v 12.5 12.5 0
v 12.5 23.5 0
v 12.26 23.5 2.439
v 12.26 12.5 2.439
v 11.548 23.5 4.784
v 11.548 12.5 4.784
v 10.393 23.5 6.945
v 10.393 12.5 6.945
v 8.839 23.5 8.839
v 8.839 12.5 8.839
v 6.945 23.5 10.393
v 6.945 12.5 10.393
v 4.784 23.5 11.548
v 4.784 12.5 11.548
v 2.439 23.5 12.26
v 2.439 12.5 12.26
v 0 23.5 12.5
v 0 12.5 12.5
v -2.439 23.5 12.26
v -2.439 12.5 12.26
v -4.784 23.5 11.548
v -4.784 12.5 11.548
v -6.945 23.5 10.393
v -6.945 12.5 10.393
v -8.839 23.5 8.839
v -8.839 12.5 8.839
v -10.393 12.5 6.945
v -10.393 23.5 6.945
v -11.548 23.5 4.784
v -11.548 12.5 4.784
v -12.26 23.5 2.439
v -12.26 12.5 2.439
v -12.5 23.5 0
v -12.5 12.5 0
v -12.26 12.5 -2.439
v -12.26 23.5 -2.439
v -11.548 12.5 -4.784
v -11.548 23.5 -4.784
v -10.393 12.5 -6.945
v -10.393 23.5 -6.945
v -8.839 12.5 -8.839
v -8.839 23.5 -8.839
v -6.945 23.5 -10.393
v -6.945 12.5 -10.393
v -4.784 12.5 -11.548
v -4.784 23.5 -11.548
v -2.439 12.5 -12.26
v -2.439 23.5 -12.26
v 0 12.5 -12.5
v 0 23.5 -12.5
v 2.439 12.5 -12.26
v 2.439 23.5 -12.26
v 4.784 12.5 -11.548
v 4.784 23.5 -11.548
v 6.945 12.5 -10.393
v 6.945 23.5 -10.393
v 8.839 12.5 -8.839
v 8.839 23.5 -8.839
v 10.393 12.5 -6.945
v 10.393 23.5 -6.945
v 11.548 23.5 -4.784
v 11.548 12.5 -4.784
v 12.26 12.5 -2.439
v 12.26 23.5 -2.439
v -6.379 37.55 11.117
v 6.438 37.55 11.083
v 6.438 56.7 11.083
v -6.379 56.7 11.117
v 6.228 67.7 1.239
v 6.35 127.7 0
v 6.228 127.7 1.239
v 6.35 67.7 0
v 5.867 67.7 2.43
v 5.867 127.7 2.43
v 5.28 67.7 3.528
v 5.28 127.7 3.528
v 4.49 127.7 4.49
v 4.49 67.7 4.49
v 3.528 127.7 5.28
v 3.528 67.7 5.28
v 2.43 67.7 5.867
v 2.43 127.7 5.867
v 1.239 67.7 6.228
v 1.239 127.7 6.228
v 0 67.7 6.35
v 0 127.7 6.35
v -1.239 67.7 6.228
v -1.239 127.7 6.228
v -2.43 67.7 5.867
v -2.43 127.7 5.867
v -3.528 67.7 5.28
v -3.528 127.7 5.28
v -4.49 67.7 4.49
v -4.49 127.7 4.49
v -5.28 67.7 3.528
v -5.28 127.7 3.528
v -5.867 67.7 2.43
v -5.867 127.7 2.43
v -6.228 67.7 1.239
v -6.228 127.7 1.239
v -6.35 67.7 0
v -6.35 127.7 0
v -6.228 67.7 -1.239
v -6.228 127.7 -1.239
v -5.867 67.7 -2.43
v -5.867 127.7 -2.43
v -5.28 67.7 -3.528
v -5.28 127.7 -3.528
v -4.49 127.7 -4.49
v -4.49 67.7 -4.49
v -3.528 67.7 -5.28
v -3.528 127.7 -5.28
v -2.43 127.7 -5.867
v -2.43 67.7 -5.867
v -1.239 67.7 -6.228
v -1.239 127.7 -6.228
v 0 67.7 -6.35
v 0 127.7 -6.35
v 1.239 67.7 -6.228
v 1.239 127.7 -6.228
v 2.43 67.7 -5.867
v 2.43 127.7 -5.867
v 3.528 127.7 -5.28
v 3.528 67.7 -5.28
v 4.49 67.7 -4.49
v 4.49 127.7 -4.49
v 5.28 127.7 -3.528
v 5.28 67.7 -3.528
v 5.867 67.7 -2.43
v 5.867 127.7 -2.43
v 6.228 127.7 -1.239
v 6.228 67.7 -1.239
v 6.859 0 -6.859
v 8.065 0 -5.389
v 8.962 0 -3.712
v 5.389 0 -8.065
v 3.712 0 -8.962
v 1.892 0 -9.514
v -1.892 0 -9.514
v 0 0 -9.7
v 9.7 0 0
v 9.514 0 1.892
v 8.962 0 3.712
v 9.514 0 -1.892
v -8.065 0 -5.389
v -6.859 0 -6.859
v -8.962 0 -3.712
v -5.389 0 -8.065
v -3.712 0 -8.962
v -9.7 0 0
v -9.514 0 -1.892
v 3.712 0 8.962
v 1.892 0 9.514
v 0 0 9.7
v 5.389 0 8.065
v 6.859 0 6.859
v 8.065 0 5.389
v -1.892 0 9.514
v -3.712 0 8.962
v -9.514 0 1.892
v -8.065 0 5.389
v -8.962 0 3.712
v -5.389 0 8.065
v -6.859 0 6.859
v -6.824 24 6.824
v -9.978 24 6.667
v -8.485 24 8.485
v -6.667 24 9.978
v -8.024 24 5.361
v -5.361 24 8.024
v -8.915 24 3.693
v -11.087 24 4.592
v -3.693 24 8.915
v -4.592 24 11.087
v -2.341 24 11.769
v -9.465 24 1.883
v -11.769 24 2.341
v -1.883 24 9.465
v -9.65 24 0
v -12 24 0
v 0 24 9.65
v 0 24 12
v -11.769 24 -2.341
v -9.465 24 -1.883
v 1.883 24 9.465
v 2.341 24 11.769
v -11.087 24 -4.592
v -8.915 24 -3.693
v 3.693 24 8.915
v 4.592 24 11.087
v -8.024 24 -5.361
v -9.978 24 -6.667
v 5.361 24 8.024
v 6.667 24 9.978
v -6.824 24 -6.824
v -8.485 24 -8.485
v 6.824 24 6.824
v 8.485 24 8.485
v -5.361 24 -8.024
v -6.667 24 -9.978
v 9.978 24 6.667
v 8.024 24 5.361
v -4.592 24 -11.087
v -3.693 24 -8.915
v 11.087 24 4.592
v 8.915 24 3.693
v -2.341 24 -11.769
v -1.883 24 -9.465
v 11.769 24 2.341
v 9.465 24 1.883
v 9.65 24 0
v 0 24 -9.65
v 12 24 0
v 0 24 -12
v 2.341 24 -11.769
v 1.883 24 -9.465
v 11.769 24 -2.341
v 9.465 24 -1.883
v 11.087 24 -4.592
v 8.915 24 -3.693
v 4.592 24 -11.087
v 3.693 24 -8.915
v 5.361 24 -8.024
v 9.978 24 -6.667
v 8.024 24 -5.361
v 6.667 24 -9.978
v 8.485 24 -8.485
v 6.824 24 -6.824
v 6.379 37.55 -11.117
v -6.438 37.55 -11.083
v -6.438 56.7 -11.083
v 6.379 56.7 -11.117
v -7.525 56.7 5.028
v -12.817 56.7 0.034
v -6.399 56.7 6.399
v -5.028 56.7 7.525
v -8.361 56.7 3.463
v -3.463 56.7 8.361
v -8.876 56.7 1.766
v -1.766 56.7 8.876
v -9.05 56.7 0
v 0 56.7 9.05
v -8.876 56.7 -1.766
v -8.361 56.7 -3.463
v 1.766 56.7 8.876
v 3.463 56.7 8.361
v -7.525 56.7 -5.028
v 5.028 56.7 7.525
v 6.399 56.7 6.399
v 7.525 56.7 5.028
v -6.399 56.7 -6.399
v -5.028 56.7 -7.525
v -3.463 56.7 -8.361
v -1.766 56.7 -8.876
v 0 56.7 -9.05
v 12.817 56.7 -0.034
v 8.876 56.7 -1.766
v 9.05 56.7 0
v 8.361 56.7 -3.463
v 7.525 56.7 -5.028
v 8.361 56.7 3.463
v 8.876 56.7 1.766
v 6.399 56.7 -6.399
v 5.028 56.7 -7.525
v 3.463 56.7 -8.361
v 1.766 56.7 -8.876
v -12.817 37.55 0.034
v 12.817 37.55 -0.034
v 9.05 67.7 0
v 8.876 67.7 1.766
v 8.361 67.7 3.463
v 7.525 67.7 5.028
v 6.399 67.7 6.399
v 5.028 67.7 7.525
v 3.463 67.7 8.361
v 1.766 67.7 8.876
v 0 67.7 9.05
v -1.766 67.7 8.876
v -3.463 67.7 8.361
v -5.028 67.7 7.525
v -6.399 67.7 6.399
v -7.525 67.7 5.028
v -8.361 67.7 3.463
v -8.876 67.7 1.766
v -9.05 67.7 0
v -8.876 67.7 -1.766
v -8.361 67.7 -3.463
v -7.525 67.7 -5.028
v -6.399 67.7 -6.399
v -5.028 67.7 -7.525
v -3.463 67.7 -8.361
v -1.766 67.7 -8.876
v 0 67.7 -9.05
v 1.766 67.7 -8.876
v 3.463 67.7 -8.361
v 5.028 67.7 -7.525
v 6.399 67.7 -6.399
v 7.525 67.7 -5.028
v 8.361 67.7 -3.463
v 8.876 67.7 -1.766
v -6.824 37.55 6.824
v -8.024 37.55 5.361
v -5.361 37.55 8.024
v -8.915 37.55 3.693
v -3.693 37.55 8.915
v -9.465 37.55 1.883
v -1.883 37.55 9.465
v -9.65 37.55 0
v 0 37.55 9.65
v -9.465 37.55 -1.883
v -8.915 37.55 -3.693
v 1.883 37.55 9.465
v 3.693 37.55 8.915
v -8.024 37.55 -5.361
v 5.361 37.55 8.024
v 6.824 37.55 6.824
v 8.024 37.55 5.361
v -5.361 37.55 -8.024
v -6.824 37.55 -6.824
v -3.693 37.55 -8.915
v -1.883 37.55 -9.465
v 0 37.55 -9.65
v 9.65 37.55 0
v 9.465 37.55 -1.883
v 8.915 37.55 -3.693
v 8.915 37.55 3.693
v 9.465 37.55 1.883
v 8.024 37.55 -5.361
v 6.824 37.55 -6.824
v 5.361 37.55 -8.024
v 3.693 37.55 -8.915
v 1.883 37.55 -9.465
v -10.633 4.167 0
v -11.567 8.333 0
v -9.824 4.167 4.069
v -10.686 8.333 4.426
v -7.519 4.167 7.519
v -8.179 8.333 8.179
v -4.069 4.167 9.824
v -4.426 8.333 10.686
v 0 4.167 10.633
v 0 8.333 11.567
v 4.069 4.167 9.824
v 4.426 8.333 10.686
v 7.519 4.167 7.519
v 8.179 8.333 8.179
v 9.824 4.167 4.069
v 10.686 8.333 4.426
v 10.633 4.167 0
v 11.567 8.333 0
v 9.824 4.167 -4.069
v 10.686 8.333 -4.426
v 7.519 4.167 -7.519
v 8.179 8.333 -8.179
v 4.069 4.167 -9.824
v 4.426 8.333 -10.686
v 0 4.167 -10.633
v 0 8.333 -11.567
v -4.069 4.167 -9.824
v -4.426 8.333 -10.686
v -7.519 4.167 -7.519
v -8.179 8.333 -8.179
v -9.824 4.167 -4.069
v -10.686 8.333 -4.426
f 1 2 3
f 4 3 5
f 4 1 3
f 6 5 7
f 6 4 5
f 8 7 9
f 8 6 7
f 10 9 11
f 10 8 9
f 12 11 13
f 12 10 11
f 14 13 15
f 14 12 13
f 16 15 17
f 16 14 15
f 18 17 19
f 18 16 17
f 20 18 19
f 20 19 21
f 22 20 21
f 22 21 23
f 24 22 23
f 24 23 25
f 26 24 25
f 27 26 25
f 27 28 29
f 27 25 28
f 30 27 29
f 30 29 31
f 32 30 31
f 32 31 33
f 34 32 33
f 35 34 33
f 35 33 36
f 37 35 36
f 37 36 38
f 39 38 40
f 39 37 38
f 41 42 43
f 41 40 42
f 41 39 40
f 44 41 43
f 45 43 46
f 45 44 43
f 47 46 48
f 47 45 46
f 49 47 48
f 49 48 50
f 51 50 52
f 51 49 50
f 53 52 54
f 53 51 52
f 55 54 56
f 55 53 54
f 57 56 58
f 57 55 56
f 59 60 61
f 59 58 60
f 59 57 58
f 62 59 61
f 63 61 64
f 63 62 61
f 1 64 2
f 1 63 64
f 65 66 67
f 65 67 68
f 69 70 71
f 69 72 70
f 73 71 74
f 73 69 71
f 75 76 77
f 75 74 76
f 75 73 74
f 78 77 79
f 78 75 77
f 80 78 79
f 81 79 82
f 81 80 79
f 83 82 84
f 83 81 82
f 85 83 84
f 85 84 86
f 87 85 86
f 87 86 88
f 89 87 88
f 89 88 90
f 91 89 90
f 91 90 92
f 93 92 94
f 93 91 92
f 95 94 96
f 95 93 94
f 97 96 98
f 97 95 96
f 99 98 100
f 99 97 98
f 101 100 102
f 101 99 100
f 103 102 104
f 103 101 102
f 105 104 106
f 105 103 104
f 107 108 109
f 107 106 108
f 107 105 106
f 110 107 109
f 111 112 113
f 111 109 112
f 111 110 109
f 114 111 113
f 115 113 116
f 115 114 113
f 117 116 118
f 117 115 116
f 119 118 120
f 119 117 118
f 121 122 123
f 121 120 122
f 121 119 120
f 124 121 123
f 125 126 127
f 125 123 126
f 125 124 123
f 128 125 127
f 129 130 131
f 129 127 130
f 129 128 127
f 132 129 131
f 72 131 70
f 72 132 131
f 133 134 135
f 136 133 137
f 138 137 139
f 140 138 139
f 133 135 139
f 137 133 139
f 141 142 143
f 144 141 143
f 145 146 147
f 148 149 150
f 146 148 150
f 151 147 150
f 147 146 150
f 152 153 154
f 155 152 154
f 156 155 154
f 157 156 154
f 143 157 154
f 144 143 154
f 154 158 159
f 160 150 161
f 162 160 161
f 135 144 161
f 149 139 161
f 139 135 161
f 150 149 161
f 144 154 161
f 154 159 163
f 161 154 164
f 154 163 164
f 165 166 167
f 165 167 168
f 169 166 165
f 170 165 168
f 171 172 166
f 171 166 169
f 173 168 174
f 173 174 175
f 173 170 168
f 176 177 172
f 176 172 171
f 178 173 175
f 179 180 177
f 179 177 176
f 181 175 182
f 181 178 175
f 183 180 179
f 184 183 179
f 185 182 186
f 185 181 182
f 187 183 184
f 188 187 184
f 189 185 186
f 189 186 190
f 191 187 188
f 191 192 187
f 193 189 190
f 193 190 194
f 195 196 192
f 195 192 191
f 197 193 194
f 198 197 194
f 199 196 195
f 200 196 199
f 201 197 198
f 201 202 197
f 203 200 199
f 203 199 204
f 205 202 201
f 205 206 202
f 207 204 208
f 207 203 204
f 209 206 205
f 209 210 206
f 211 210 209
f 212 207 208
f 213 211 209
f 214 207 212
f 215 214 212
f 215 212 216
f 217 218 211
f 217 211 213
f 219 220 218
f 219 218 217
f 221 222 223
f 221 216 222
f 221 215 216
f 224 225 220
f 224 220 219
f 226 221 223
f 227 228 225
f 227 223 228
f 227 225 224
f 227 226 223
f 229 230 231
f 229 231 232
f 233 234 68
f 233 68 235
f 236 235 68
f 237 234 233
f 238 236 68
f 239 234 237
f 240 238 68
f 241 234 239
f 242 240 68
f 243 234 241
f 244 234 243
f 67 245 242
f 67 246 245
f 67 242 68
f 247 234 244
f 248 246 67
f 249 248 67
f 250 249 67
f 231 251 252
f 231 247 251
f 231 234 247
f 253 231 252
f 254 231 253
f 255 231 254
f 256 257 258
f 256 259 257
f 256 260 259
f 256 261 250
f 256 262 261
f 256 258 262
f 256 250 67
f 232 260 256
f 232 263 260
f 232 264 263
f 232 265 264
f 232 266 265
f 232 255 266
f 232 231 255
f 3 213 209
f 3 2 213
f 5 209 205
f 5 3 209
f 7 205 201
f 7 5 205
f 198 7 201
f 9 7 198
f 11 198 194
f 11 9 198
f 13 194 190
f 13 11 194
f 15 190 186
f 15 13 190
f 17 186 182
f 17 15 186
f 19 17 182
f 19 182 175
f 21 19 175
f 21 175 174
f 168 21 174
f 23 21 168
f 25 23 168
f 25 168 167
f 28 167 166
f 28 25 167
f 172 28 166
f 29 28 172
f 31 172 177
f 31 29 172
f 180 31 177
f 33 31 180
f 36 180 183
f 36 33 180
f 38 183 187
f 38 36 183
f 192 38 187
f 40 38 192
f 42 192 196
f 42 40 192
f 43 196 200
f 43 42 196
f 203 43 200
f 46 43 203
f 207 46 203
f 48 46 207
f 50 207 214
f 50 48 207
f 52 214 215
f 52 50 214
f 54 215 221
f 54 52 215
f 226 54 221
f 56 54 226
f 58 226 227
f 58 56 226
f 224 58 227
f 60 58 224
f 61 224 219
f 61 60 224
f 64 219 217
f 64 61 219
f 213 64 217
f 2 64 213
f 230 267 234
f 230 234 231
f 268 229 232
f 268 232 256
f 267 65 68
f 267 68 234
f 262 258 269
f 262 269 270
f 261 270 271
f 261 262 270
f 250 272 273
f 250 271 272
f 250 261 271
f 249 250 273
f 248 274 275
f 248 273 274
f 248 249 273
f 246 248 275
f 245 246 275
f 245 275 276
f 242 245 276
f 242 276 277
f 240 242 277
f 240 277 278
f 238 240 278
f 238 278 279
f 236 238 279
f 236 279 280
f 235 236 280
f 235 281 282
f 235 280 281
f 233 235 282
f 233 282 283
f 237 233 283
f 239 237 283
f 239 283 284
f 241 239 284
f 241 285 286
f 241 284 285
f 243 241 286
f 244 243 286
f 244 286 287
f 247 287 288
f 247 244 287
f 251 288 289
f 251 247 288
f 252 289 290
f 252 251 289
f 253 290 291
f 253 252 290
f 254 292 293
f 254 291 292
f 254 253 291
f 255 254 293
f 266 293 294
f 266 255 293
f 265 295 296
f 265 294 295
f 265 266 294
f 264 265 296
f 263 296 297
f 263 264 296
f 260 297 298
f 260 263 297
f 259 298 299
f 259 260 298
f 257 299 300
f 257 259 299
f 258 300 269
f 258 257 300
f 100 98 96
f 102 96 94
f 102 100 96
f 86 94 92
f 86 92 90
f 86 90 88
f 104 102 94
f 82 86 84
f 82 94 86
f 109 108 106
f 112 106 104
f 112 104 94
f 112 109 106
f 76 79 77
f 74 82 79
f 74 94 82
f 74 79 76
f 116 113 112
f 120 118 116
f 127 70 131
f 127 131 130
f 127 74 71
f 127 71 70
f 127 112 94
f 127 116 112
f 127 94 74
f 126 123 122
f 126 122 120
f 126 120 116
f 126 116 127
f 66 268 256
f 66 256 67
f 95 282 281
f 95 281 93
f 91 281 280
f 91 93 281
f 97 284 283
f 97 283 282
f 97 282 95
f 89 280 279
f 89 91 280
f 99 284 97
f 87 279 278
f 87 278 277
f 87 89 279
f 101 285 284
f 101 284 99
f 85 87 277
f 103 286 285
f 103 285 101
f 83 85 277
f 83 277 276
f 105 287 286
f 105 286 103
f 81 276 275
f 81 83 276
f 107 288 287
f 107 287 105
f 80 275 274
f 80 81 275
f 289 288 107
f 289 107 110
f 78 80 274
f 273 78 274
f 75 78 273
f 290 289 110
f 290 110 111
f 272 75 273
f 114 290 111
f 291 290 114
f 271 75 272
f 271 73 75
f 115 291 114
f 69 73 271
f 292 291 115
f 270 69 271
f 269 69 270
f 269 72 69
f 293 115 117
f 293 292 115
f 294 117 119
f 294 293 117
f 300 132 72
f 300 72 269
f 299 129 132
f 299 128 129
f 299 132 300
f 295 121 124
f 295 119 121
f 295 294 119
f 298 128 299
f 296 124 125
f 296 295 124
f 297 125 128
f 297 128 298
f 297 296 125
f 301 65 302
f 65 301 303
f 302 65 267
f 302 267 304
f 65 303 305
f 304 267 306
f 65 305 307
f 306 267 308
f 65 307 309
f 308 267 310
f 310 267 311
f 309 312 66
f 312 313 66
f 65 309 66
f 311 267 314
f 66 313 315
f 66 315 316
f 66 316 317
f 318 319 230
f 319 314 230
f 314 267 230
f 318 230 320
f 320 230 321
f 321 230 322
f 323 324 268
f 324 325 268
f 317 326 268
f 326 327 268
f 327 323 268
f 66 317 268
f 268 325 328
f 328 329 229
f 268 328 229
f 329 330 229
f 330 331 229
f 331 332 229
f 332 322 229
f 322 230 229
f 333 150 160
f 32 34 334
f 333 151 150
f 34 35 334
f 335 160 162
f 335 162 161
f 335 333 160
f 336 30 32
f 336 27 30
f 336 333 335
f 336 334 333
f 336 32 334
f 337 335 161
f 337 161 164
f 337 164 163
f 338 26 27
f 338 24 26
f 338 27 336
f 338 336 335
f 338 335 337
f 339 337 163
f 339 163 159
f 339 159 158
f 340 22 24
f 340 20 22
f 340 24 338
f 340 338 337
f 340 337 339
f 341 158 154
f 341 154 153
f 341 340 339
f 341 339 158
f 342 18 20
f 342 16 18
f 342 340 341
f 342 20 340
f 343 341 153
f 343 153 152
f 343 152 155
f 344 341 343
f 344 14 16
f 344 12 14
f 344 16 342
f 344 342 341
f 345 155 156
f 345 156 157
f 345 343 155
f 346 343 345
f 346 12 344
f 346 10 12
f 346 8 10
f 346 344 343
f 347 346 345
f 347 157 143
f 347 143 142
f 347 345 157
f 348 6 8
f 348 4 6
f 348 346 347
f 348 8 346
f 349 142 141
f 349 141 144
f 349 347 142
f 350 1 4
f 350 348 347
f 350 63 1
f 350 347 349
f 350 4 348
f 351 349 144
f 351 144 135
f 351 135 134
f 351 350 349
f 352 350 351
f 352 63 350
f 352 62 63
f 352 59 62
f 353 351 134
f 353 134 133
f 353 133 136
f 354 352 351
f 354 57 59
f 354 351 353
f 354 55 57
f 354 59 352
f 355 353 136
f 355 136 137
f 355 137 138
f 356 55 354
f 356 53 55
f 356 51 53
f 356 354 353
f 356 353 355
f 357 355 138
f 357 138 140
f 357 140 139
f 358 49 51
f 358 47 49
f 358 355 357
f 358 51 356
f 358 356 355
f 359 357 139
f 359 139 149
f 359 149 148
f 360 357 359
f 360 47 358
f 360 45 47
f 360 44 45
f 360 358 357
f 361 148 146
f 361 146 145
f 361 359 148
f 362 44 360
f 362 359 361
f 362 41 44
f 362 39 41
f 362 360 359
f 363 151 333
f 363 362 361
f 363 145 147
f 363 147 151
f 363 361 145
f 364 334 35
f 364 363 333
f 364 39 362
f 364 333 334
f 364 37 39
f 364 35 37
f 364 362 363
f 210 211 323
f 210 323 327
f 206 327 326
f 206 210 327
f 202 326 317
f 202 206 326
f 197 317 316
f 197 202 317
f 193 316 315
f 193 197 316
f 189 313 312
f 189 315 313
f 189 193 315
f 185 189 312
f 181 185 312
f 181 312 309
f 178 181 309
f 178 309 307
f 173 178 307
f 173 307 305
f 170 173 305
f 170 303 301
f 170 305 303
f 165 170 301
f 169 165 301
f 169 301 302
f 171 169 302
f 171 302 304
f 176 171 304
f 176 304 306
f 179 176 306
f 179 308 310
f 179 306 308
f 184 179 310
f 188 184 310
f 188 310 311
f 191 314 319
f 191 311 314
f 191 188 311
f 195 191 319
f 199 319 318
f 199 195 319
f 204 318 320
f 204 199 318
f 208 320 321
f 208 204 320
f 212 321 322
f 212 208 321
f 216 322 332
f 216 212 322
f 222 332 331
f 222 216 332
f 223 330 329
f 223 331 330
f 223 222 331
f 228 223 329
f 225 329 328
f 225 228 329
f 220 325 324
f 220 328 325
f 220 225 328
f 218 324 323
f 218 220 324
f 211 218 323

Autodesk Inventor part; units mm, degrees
ref_plane "YZ Plane" through (0, 0, 0) normal (1, 0, 0) x (0, 1, 0)
ref_plane "XY Plane" through (0, 0, 0) normal (0, 0, 1) x (1, 0, 0)
sketch "Sketch1" plane through (0, 0, 0) normal (0, 1, 0) x (-1, 0, 0)
  circle A0 centre (0, 0) radius 9.7
  dimension "d0" = 19.4
ref_plane "Work Plane1" through (0, 12.5, 0) normal (0, 1, 0) x (-1, 0, 0)
sketch "Sketch2" plane through (0, 12.5, 0) normal (0, 1, 0) x (-1, 0, 0)
  circle A0 centre (0, 0) radius 12.5
  dimension "d2" = 25
loft "Loft1" add profiles "Sketch1", "Sketch2"
sketch "Sketch5" plane through (0, 12.5, 0) normal (0, 1, 0) x (1, 0, 0)
  circle A0 centre (0, 0) radius 12.5
  dimension "d9" = 25
extrude "Extrusion1" add sketch "Sketch5" along normal blind 11.5
sketch "Sketch6" plane through (0, 24, 0) normal (0, 1, 0) x (1, 0, 0)
  circle A0 centre (0, 0) radius 9.65
  dimension "d12" = 19.3
extrude "Extrusion2" add sketch "Sketch6" along normal blind 13.55
sketch "Sketch7" plane through (0, 37.55, 0) normal (0, 1, 0) x (1, 0, 0)
  line L0 (-6.3788, -11.1172) -> (-12.8171, -0.0344)
  line L1 (-12.8171, -0.0344) -> (-6.4384, 11.0828)
  line L2 (-6.4384, 11.0828) -> (6.3788, 11.1172)
  line L3 (6.3788, 11.1172) -> (12.8171, 0.0344)
  line L4 (12.8171, 0.0344) -> (6.4384, -11.0828)
  line L5 (6.4384, -11.0828) -> (-6.3788, -11.1172)
  point P0 (0, 0)
  point P1 (0, 0)
  dimension "d15" = 22.2
extrude "Extrusion3" add sketch "Sketch7" along normal blind 19.15
sketch "Sketch8" plane through (0, 56.7, 0) normal (0, 1, 0) x (1, 0, 0)
  circle A0 centre (0, 0) radius 9.05
  dimension "d18" = 18.1
extrude "Extrusion4" add sketch "Sketch8" along normal blind 11
sketch "Sketch9" plane through (0, 67.7, 0) normal (0, 1, 0) x (1, 0, 0)
  circle A0 centre (0, 0) radius 6.35
  dimension "d21" = 12.7
extrude "Extrusion5" add sketch "Sketch9" along normal blind 14
sketch "Sketch10" plane through (0, 81.7, 0) normal (0, 1, 0) x (1, 0, 0)
  circle A0 centre (0, 0) radius 6.35
  dimension "d26" = 12.7
extrude "Extrusion6" add sketch "Sketch10" along normal blind 46
thread "Thread2" size "1/2-13 UNC" class "2A" standard "ANSI Unified Screw Threads" length 48
chamfer "Chamfer1" distance 0.5 angle 45 1 edges at (-12.5, 24, 0)
properties part number "Soporte Bailarina" material "Steel, Alloy"
